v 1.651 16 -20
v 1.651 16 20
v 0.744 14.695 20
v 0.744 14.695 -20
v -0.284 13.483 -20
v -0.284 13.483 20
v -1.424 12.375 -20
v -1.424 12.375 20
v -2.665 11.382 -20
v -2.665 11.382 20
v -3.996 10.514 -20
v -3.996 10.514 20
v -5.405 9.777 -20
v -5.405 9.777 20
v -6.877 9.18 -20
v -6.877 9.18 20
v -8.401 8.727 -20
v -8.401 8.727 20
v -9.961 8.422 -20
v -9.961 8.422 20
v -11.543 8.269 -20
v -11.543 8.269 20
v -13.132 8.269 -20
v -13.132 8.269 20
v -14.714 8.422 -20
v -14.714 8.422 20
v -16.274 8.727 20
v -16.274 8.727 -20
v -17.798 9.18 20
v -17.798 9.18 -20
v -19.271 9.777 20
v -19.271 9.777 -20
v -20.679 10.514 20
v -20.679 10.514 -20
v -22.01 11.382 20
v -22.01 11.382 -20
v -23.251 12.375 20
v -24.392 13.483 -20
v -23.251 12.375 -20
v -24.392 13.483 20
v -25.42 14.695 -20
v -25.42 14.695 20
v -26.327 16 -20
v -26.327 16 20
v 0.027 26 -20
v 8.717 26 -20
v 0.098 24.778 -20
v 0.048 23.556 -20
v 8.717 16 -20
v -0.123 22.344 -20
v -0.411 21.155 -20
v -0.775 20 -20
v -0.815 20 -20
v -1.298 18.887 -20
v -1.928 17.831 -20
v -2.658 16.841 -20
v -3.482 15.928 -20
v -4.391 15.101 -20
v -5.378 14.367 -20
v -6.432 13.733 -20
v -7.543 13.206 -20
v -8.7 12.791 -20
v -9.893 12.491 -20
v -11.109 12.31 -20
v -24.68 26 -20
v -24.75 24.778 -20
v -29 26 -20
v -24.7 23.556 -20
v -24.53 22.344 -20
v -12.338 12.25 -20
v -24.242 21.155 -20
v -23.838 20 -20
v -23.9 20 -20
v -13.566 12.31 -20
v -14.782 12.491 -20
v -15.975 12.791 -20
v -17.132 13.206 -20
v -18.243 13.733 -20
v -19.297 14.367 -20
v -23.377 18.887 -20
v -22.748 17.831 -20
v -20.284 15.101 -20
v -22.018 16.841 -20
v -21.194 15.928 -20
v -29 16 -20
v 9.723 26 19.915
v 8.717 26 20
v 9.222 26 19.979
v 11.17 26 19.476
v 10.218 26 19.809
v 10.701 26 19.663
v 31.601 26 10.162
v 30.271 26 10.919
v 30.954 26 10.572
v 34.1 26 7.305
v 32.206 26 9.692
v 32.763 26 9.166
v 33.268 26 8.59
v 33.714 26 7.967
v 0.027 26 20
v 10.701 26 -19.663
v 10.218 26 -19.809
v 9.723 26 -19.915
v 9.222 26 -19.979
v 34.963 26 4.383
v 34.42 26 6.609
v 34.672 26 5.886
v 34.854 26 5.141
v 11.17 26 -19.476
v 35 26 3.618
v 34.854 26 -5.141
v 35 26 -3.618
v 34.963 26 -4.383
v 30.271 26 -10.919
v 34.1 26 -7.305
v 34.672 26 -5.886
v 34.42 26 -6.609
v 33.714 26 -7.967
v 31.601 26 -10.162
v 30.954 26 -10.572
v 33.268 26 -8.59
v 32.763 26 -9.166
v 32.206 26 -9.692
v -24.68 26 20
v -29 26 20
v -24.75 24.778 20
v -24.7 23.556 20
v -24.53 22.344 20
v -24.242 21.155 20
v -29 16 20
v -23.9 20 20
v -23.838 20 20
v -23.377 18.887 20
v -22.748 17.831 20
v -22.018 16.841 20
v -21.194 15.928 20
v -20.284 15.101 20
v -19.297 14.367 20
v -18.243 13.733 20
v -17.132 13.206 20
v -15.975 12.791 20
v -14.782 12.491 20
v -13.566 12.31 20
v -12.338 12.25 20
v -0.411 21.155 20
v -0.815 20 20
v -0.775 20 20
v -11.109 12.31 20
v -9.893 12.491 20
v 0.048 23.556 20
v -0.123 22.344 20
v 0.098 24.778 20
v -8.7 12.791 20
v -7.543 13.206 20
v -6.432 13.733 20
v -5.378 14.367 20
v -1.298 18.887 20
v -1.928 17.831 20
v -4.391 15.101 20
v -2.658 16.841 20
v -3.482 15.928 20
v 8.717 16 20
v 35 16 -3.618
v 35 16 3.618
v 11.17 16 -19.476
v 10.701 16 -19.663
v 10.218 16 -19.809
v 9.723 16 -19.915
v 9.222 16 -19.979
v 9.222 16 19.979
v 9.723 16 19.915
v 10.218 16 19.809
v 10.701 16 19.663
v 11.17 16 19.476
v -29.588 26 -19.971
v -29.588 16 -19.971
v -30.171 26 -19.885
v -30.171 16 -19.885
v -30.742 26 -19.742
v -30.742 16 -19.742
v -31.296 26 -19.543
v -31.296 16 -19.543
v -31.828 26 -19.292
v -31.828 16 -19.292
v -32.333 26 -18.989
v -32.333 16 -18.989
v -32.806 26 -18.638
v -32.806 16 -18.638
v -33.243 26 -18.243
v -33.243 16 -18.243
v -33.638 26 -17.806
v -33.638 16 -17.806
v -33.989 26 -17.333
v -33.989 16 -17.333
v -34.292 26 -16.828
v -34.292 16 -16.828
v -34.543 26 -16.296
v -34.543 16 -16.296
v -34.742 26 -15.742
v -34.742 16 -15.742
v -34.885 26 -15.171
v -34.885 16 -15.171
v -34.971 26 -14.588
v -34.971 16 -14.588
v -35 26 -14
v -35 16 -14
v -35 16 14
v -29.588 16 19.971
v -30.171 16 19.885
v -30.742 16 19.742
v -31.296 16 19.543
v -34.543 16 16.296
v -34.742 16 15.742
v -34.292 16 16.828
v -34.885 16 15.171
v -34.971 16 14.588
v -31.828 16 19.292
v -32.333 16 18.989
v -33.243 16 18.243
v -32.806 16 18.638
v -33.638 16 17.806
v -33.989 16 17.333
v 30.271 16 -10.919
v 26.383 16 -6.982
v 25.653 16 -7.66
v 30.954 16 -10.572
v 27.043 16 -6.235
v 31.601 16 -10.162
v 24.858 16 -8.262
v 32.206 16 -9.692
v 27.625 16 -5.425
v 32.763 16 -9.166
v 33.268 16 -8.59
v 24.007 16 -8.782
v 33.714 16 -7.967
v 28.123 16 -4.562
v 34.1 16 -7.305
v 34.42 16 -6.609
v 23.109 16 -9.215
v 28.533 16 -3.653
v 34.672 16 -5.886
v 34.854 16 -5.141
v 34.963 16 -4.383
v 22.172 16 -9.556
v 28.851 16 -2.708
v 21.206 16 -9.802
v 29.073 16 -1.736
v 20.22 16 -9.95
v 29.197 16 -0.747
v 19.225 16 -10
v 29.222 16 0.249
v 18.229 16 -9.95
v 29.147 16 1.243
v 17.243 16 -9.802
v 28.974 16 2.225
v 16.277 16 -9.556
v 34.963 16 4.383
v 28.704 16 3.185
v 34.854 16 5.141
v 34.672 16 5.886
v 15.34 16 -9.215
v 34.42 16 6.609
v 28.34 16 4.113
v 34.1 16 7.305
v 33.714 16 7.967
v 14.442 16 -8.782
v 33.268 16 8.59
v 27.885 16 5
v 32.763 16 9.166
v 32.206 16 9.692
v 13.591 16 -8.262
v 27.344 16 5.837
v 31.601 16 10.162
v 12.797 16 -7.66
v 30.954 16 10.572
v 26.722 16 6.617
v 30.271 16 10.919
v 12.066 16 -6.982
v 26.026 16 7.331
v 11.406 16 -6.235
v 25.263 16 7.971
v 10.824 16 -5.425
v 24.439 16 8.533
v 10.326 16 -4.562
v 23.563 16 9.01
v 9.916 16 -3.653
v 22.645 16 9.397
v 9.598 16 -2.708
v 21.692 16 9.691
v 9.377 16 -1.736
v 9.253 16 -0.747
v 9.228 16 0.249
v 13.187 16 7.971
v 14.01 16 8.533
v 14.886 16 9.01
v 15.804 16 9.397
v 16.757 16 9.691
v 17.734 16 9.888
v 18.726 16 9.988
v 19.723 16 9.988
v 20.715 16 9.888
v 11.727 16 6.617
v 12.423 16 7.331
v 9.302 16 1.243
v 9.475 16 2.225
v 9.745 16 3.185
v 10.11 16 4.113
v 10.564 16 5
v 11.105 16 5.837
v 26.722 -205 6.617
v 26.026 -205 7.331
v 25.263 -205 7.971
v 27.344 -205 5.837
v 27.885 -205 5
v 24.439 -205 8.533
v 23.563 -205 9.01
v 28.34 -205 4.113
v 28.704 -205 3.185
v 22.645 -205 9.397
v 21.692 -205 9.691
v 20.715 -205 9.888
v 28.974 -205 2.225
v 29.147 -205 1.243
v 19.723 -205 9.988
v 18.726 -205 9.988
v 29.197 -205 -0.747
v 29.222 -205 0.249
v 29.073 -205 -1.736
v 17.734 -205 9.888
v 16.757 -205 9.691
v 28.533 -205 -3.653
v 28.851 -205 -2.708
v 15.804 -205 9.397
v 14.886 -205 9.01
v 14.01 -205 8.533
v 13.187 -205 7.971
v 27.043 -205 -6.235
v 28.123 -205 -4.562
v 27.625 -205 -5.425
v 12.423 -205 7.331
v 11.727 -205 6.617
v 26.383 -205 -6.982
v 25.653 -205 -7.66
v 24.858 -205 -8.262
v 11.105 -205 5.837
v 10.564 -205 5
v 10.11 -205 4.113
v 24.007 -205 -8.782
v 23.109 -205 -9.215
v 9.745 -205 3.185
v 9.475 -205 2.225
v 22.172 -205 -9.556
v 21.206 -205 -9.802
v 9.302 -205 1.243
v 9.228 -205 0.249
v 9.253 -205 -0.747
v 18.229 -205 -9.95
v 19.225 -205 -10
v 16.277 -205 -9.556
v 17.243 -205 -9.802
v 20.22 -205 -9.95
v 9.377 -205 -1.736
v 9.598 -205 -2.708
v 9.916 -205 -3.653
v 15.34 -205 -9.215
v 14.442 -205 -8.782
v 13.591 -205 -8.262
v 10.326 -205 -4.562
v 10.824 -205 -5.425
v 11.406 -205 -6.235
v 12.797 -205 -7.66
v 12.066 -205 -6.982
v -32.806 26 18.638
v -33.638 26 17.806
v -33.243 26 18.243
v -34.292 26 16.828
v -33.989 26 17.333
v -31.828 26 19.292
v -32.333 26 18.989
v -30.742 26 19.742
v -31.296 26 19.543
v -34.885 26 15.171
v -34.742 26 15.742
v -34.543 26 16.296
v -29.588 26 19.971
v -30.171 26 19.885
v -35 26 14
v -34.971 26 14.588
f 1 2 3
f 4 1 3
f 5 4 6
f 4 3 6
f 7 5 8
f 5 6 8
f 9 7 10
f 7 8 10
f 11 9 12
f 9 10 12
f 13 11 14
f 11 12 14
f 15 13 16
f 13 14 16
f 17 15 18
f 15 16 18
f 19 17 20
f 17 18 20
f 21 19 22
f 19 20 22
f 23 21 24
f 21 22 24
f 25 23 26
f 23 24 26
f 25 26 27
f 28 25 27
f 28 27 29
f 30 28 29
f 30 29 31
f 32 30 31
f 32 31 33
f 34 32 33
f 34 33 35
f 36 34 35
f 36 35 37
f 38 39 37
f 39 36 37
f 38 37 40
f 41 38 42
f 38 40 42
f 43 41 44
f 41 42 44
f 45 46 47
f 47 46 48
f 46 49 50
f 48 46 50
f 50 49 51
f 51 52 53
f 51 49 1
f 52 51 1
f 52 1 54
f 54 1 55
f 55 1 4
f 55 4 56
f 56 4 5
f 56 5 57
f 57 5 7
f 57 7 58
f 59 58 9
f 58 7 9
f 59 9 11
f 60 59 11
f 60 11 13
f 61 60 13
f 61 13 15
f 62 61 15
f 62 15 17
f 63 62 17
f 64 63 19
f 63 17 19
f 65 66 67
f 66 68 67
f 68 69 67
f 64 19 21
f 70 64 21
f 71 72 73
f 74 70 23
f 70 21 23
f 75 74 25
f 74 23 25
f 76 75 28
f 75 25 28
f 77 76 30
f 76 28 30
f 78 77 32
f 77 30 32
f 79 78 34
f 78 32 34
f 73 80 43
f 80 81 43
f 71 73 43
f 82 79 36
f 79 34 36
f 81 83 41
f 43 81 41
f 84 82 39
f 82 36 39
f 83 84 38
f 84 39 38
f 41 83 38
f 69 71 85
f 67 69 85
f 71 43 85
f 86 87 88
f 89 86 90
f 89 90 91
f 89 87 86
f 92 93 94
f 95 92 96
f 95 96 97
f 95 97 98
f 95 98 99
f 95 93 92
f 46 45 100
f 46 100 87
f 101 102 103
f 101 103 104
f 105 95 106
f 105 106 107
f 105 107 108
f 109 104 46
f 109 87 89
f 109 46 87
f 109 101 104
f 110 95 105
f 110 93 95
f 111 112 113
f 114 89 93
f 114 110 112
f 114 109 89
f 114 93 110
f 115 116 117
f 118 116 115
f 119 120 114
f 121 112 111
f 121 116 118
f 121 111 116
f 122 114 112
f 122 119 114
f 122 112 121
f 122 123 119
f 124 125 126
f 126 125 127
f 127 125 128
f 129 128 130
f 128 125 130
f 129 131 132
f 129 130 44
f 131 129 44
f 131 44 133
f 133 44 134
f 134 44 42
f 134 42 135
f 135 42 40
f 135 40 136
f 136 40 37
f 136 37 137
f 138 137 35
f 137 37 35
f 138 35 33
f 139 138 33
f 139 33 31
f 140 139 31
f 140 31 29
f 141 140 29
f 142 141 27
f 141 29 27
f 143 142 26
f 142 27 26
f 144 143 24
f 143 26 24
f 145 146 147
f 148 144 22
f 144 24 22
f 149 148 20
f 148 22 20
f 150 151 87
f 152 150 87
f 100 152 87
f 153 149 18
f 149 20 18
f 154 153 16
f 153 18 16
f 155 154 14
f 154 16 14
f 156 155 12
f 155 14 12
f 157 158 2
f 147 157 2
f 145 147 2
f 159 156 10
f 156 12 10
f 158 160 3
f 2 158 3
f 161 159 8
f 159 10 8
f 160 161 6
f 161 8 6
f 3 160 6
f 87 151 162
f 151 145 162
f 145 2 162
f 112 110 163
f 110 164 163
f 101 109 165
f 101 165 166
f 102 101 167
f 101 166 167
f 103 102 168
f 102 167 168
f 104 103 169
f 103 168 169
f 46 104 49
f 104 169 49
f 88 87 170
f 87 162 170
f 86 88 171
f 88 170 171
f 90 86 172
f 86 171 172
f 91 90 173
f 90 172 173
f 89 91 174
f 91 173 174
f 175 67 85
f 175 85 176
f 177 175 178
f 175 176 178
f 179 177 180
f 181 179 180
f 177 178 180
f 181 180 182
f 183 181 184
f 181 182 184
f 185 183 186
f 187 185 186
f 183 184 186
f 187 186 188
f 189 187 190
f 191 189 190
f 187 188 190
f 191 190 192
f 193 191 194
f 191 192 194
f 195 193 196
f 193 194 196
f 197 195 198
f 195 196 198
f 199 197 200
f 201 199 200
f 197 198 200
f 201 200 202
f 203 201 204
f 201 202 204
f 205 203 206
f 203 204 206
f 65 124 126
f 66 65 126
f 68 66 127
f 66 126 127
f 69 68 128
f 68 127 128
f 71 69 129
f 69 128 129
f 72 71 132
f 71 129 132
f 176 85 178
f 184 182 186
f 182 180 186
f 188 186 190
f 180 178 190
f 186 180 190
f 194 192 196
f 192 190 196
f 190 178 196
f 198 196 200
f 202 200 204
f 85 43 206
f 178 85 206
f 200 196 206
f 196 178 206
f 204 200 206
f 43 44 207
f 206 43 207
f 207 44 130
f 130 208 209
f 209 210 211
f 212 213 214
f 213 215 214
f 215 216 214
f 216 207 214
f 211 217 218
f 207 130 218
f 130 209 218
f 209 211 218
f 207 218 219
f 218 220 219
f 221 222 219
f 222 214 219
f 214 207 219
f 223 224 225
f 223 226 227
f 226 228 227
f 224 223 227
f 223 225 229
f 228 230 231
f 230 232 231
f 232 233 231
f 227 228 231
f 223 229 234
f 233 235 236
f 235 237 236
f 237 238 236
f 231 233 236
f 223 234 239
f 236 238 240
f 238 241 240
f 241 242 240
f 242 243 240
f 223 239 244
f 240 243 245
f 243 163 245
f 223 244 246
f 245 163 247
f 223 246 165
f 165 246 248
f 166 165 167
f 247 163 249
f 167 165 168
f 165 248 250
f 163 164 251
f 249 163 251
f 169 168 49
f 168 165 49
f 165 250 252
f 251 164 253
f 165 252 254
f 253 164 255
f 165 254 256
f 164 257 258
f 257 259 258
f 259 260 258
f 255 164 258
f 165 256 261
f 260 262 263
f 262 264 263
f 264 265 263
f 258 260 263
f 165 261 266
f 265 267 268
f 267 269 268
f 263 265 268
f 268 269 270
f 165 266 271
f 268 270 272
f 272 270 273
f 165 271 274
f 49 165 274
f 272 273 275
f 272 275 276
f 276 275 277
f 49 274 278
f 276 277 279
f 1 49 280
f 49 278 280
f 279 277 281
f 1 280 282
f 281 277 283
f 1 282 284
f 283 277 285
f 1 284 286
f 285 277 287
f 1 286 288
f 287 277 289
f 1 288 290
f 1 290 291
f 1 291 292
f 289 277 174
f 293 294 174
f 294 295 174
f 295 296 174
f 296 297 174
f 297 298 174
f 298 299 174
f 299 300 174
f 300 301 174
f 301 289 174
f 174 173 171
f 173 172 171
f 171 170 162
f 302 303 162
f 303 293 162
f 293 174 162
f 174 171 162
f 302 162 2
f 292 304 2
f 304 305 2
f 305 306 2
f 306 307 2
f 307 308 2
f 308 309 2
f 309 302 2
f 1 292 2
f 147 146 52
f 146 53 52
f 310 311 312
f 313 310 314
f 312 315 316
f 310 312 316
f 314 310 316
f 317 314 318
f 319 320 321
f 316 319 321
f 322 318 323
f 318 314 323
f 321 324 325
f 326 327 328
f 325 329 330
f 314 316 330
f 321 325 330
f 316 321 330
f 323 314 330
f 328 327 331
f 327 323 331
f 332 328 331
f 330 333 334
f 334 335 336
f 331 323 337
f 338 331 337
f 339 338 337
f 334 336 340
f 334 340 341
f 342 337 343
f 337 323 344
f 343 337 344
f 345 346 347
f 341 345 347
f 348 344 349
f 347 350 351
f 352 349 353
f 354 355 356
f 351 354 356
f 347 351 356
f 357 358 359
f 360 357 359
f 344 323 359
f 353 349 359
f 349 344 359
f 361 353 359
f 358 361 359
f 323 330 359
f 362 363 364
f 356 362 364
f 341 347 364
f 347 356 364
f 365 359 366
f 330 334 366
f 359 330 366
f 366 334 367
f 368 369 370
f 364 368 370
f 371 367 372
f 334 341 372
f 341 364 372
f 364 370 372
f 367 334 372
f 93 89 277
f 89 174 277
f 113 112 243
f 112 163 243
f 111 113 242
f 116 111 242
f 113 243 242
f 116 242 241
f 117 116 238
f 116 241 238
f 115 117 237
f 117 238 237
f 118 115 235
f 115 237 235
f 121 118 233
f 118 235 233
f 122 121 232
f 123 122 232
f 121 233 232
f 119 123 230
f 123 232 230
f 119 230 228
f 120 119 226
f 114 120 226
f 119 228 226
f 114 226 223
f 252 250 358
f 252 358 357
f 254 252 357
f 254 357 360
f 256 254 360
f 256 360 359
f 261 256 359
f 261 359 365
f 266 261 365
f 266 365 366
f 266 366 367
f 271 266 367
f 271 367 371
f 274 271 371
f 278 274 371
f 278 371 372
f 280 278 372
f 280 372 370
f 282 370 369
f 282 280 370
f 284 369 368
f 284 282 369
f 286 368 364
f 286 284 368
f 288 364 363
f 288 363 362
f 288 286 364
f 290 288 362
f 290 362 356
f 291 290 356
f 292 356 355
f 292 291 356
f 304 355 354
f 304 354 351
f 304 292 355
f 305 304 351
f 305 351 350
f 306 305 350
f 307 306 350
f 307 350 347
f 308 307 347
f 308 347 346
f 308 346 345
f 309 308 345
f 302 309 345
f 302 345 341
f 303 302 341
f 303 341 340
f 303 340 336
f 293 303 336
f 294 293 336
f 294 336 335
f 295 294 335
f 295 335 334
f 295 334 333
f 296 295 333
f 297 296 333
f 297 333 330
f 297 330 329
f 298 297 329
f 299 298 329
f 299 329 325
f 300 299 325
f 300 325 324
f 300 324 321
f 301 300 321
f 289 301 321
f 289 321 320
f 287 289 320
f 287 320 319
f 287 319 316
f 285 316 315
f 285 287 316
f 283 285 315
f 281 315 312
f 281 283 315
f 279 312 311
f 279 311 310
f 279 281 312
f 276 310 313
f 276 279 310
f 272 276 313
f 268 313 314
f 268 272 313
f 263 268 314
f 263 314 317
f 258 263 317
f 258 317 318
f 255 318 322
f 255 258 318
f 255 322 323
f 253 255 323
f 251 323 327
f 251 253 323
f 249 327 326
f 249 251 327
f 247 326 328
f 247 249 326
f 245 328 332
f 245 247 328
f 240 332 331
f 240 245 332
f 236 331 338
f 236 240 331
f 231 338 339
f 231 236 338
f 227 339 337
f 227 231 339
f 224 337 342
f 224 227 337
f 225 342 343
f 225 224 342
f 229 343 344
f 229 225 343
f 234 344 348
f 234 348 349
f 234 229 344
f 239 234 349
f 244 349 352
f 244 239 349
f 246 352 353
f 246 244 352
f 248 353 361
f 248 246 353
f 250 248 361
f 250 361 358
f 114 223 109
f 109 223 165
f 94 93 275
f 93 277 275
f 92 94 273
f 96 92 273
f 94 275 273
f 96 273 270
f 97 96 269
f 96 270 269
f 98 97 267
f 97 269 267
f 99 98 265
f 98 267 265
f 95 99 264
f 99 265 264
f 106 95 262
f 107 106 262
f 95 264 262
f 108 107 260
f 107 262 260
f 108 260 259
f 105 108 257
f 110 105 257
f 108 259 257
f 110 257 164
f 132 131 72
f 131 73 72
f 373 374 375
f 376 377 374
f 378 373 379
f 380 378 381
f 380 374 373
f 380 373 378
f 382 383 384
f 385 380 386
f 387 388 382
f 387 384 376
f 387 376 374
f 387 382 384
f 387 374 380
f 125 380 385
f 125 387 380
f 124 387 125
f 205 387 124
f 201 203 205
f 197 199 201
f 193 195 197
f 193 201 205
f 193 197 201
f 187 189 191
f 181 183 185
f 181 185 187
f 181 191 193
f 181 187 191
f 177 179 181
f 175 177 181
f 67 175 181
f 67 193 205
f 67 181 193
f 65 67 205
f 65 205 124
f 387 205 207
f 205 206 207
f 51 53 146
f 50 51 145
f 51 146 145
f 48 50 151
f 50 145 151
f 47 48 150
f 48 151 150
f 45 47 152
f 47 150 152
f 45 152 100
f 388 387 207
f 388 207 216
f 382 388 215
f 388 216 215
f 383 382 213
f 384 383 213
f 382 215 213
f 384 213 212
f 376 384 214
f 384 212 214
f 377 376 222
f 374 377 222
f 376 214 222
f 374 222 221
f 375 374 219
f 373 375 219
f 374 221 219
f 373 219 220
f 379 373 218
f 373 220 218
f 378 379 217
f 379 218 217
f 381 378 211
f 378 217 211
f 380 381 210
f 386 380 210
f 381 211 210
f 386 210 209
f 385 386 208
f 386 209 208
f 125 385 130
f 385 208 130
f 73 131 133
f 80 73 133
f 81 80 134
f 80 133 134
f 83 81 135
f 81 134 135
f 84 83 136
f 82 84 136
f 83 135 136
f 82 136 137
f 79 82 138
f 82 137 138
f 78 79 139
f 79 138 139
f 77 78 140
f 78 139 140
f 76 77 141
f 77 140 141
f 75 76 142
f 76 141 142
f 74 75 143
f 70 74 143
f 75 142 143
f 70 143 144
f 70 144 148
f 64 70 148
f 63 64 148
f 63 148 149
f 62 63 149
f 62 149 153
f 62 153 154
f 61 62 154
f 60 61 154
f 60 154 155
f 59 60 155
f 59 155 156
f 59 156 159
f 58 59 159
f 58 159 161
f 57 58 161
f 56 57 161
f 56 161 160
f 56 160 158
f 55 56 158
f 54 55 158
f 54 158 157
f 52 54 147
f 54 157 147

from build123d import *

# Parameters (mm, degrees)
BOSS_EXTRUDE1_DEPTH  = 20
SKETCH3_OUTSIDE_W    = 88.614
SKETCH3_OUTSIDE_H    = 38.614
CUT_EXTRUDE2_DEPTH   = 57.789083458
BOSS_EXTRUDE3_START  = 20
SKETCH4_R            = 10
BOSS_EXTRUDE3_DEPTH  = 225
BOSS_EXTRUDE22_DEPTH = 6
SKETCH47_R           = 12.424441969
CUT_EXTRUDE8_DEPTH   = 212.778185845


with BuildPart() as part:
    # Sketch2 → Boss-Extrude1 (new body)
    with BuildSketch(Plane(origin=(0, 0, 0), x_dir=(1, 0, 0), z_dir=(0, 1, 0))):
        with BuildLine():
            Line((-35, -14), (-35, 14))
            ThreePointArc((-35, 14), (-33.242640687, 18.242640687), (-29, 20))
            Line((-29, 20), (8.717414306, 20))
            ThreePointArc((8.717414306, 20), (9.971663529, 19.867440574), (11.1704919, 19.475619629))
            Line((11.1704919, 19.475619629), (30.270770125, 10.918694984))
            ThreePointArc((30.270770125, 10.918694984), (33.714393532, 7.967227328), (35, 3.617868812))
            Line((35, 3.617868812), (35, -3.617868812))
            ThreePointArc((35, -3.617868812), (33.714393532, -7.967227328), (30.270770125, -10.918694984))
            Line((30.270770125, -10.918694984), (11.1704919, -19.475619629))
            ThreePointArc((11.1704919, -19.475619629), (9.971663529, -19.867440574), (8.717414306, -20))
            Line((8.717414306, -20), (-29, -20))
            ThreePointArc((-29, -20), (-33.242640687, -18.242640687), (-35, -14))
        make_face()
    extrude(amount=BOSS_EXTRUDE1_DEPTH)

    # Sketch3 outside → Cut-Extrude2 (cut, through all)
    with BuildSketch(Plane.XY.offset(20)):
        with Locations((0, 10)):
            Rectangle(SKETCH3_OUTSIDE_W, SKETCH3_OUTSIDE_H)
        with BuildLine():
            Line((-35, 20), (-23.9, 20))
            ThreePointArc((-23.9, 20), (-12.33766892, 12.25), (-0.77533784, 20))
            Line((-0.77533784, 20), (35, 20))
            Line((35, 20), (35, 16))
            Line((35, 16), (1.651165913, 16))
            ThreePointArc((1.651165913, 16), (-12.33766892, 8.25), (-26.326503754, 16))
            Line((-26.326503754, 16), (-35, 16))
            Line((-35, 16), (-35, 20))
        make_face(mode=Mode.SUBTRACT)
    extrude(amount=-CUT_EXTRUDE2_DEPTH, mode=Mode.SUBTRACT)



with BuildPart() as body_2:
    # Sketch4 → Boss-Extrude3 (new body)
    with BuildSketch(Plane(origin=(0, 0, 0), x_dir=(1, 0, 0), z_dir=(0, 1, 0)).offset(BOSS_EXTRUDE3_START)):
        with Locations(Location((19.22466216, 0, 0), (0, 0, 90))):
            Circle(SKETCH4_R)
    extrude(amount=-BOSS_EXTRUDE3_DEPTH)


with BuildPart() as part_1:
    add(part.part)

    add(body_2.part)  # Boss-Extrude22 merges body 2
    # Sketch46 → Boss-Extrude22 (add)
    with BuildSketch(Plane(origin=(0, 20, 0), x_dir=(1, 0, 0), z_dir=(0, 1, 0))):
        with BuildLine():
            Line((8.717414306, 20), (-29, 20))
            ThreePointArc((-29, 20), (-33.242640687, 18.242640687), (-35, 14))
            Line((-35, 14), (-35, -14))
            ThreePointArc((-35, -14), (-33.242640687, -18.242640687), (-29, -20))
            Line((-29, -20), (8.717414306, -20))
            ThreePointArc((8.717414306, -20), (9.971663529, -19.867440574), (11.1704919, -19.475619629))
            Line((11.1704919, -19.475619629), (30.270770125, -10.918694984))
            ThreePointArc((30.270770125, -10.918694984), (33.714393532, -7.967227328), (35, -3.617868812))
            Line((35, -3.617868812), (35, 3.617868812))
            ThreePointArc((35, 3.617868812), (33.714393532, 7.967227328), (30.270770125, 10.918694984))
            Line((30.270770125, 10.918694984), (11.1704919, 19.475619629))
            ThreePointArc((11.1704919, 19.475619629), (9.971663529, 19.867440574), (8.717414306, 20))
        make_face()
    extrude(amount=BOSS_EXTRUDE22_DEPTH)

    # Sketch47 → Cut-Extrude8 (cut, through all)
    with BuildSketch(Plane.XY.offset(20)):
        with Locations((-12.32630139, 24.675301972)):
            Circle(SKETCH47_R)
    extrude(amount=-CUT_EXTRUDE8_DEPTH, mode=Mode.SUBTRACT)


solid = part_1.part
